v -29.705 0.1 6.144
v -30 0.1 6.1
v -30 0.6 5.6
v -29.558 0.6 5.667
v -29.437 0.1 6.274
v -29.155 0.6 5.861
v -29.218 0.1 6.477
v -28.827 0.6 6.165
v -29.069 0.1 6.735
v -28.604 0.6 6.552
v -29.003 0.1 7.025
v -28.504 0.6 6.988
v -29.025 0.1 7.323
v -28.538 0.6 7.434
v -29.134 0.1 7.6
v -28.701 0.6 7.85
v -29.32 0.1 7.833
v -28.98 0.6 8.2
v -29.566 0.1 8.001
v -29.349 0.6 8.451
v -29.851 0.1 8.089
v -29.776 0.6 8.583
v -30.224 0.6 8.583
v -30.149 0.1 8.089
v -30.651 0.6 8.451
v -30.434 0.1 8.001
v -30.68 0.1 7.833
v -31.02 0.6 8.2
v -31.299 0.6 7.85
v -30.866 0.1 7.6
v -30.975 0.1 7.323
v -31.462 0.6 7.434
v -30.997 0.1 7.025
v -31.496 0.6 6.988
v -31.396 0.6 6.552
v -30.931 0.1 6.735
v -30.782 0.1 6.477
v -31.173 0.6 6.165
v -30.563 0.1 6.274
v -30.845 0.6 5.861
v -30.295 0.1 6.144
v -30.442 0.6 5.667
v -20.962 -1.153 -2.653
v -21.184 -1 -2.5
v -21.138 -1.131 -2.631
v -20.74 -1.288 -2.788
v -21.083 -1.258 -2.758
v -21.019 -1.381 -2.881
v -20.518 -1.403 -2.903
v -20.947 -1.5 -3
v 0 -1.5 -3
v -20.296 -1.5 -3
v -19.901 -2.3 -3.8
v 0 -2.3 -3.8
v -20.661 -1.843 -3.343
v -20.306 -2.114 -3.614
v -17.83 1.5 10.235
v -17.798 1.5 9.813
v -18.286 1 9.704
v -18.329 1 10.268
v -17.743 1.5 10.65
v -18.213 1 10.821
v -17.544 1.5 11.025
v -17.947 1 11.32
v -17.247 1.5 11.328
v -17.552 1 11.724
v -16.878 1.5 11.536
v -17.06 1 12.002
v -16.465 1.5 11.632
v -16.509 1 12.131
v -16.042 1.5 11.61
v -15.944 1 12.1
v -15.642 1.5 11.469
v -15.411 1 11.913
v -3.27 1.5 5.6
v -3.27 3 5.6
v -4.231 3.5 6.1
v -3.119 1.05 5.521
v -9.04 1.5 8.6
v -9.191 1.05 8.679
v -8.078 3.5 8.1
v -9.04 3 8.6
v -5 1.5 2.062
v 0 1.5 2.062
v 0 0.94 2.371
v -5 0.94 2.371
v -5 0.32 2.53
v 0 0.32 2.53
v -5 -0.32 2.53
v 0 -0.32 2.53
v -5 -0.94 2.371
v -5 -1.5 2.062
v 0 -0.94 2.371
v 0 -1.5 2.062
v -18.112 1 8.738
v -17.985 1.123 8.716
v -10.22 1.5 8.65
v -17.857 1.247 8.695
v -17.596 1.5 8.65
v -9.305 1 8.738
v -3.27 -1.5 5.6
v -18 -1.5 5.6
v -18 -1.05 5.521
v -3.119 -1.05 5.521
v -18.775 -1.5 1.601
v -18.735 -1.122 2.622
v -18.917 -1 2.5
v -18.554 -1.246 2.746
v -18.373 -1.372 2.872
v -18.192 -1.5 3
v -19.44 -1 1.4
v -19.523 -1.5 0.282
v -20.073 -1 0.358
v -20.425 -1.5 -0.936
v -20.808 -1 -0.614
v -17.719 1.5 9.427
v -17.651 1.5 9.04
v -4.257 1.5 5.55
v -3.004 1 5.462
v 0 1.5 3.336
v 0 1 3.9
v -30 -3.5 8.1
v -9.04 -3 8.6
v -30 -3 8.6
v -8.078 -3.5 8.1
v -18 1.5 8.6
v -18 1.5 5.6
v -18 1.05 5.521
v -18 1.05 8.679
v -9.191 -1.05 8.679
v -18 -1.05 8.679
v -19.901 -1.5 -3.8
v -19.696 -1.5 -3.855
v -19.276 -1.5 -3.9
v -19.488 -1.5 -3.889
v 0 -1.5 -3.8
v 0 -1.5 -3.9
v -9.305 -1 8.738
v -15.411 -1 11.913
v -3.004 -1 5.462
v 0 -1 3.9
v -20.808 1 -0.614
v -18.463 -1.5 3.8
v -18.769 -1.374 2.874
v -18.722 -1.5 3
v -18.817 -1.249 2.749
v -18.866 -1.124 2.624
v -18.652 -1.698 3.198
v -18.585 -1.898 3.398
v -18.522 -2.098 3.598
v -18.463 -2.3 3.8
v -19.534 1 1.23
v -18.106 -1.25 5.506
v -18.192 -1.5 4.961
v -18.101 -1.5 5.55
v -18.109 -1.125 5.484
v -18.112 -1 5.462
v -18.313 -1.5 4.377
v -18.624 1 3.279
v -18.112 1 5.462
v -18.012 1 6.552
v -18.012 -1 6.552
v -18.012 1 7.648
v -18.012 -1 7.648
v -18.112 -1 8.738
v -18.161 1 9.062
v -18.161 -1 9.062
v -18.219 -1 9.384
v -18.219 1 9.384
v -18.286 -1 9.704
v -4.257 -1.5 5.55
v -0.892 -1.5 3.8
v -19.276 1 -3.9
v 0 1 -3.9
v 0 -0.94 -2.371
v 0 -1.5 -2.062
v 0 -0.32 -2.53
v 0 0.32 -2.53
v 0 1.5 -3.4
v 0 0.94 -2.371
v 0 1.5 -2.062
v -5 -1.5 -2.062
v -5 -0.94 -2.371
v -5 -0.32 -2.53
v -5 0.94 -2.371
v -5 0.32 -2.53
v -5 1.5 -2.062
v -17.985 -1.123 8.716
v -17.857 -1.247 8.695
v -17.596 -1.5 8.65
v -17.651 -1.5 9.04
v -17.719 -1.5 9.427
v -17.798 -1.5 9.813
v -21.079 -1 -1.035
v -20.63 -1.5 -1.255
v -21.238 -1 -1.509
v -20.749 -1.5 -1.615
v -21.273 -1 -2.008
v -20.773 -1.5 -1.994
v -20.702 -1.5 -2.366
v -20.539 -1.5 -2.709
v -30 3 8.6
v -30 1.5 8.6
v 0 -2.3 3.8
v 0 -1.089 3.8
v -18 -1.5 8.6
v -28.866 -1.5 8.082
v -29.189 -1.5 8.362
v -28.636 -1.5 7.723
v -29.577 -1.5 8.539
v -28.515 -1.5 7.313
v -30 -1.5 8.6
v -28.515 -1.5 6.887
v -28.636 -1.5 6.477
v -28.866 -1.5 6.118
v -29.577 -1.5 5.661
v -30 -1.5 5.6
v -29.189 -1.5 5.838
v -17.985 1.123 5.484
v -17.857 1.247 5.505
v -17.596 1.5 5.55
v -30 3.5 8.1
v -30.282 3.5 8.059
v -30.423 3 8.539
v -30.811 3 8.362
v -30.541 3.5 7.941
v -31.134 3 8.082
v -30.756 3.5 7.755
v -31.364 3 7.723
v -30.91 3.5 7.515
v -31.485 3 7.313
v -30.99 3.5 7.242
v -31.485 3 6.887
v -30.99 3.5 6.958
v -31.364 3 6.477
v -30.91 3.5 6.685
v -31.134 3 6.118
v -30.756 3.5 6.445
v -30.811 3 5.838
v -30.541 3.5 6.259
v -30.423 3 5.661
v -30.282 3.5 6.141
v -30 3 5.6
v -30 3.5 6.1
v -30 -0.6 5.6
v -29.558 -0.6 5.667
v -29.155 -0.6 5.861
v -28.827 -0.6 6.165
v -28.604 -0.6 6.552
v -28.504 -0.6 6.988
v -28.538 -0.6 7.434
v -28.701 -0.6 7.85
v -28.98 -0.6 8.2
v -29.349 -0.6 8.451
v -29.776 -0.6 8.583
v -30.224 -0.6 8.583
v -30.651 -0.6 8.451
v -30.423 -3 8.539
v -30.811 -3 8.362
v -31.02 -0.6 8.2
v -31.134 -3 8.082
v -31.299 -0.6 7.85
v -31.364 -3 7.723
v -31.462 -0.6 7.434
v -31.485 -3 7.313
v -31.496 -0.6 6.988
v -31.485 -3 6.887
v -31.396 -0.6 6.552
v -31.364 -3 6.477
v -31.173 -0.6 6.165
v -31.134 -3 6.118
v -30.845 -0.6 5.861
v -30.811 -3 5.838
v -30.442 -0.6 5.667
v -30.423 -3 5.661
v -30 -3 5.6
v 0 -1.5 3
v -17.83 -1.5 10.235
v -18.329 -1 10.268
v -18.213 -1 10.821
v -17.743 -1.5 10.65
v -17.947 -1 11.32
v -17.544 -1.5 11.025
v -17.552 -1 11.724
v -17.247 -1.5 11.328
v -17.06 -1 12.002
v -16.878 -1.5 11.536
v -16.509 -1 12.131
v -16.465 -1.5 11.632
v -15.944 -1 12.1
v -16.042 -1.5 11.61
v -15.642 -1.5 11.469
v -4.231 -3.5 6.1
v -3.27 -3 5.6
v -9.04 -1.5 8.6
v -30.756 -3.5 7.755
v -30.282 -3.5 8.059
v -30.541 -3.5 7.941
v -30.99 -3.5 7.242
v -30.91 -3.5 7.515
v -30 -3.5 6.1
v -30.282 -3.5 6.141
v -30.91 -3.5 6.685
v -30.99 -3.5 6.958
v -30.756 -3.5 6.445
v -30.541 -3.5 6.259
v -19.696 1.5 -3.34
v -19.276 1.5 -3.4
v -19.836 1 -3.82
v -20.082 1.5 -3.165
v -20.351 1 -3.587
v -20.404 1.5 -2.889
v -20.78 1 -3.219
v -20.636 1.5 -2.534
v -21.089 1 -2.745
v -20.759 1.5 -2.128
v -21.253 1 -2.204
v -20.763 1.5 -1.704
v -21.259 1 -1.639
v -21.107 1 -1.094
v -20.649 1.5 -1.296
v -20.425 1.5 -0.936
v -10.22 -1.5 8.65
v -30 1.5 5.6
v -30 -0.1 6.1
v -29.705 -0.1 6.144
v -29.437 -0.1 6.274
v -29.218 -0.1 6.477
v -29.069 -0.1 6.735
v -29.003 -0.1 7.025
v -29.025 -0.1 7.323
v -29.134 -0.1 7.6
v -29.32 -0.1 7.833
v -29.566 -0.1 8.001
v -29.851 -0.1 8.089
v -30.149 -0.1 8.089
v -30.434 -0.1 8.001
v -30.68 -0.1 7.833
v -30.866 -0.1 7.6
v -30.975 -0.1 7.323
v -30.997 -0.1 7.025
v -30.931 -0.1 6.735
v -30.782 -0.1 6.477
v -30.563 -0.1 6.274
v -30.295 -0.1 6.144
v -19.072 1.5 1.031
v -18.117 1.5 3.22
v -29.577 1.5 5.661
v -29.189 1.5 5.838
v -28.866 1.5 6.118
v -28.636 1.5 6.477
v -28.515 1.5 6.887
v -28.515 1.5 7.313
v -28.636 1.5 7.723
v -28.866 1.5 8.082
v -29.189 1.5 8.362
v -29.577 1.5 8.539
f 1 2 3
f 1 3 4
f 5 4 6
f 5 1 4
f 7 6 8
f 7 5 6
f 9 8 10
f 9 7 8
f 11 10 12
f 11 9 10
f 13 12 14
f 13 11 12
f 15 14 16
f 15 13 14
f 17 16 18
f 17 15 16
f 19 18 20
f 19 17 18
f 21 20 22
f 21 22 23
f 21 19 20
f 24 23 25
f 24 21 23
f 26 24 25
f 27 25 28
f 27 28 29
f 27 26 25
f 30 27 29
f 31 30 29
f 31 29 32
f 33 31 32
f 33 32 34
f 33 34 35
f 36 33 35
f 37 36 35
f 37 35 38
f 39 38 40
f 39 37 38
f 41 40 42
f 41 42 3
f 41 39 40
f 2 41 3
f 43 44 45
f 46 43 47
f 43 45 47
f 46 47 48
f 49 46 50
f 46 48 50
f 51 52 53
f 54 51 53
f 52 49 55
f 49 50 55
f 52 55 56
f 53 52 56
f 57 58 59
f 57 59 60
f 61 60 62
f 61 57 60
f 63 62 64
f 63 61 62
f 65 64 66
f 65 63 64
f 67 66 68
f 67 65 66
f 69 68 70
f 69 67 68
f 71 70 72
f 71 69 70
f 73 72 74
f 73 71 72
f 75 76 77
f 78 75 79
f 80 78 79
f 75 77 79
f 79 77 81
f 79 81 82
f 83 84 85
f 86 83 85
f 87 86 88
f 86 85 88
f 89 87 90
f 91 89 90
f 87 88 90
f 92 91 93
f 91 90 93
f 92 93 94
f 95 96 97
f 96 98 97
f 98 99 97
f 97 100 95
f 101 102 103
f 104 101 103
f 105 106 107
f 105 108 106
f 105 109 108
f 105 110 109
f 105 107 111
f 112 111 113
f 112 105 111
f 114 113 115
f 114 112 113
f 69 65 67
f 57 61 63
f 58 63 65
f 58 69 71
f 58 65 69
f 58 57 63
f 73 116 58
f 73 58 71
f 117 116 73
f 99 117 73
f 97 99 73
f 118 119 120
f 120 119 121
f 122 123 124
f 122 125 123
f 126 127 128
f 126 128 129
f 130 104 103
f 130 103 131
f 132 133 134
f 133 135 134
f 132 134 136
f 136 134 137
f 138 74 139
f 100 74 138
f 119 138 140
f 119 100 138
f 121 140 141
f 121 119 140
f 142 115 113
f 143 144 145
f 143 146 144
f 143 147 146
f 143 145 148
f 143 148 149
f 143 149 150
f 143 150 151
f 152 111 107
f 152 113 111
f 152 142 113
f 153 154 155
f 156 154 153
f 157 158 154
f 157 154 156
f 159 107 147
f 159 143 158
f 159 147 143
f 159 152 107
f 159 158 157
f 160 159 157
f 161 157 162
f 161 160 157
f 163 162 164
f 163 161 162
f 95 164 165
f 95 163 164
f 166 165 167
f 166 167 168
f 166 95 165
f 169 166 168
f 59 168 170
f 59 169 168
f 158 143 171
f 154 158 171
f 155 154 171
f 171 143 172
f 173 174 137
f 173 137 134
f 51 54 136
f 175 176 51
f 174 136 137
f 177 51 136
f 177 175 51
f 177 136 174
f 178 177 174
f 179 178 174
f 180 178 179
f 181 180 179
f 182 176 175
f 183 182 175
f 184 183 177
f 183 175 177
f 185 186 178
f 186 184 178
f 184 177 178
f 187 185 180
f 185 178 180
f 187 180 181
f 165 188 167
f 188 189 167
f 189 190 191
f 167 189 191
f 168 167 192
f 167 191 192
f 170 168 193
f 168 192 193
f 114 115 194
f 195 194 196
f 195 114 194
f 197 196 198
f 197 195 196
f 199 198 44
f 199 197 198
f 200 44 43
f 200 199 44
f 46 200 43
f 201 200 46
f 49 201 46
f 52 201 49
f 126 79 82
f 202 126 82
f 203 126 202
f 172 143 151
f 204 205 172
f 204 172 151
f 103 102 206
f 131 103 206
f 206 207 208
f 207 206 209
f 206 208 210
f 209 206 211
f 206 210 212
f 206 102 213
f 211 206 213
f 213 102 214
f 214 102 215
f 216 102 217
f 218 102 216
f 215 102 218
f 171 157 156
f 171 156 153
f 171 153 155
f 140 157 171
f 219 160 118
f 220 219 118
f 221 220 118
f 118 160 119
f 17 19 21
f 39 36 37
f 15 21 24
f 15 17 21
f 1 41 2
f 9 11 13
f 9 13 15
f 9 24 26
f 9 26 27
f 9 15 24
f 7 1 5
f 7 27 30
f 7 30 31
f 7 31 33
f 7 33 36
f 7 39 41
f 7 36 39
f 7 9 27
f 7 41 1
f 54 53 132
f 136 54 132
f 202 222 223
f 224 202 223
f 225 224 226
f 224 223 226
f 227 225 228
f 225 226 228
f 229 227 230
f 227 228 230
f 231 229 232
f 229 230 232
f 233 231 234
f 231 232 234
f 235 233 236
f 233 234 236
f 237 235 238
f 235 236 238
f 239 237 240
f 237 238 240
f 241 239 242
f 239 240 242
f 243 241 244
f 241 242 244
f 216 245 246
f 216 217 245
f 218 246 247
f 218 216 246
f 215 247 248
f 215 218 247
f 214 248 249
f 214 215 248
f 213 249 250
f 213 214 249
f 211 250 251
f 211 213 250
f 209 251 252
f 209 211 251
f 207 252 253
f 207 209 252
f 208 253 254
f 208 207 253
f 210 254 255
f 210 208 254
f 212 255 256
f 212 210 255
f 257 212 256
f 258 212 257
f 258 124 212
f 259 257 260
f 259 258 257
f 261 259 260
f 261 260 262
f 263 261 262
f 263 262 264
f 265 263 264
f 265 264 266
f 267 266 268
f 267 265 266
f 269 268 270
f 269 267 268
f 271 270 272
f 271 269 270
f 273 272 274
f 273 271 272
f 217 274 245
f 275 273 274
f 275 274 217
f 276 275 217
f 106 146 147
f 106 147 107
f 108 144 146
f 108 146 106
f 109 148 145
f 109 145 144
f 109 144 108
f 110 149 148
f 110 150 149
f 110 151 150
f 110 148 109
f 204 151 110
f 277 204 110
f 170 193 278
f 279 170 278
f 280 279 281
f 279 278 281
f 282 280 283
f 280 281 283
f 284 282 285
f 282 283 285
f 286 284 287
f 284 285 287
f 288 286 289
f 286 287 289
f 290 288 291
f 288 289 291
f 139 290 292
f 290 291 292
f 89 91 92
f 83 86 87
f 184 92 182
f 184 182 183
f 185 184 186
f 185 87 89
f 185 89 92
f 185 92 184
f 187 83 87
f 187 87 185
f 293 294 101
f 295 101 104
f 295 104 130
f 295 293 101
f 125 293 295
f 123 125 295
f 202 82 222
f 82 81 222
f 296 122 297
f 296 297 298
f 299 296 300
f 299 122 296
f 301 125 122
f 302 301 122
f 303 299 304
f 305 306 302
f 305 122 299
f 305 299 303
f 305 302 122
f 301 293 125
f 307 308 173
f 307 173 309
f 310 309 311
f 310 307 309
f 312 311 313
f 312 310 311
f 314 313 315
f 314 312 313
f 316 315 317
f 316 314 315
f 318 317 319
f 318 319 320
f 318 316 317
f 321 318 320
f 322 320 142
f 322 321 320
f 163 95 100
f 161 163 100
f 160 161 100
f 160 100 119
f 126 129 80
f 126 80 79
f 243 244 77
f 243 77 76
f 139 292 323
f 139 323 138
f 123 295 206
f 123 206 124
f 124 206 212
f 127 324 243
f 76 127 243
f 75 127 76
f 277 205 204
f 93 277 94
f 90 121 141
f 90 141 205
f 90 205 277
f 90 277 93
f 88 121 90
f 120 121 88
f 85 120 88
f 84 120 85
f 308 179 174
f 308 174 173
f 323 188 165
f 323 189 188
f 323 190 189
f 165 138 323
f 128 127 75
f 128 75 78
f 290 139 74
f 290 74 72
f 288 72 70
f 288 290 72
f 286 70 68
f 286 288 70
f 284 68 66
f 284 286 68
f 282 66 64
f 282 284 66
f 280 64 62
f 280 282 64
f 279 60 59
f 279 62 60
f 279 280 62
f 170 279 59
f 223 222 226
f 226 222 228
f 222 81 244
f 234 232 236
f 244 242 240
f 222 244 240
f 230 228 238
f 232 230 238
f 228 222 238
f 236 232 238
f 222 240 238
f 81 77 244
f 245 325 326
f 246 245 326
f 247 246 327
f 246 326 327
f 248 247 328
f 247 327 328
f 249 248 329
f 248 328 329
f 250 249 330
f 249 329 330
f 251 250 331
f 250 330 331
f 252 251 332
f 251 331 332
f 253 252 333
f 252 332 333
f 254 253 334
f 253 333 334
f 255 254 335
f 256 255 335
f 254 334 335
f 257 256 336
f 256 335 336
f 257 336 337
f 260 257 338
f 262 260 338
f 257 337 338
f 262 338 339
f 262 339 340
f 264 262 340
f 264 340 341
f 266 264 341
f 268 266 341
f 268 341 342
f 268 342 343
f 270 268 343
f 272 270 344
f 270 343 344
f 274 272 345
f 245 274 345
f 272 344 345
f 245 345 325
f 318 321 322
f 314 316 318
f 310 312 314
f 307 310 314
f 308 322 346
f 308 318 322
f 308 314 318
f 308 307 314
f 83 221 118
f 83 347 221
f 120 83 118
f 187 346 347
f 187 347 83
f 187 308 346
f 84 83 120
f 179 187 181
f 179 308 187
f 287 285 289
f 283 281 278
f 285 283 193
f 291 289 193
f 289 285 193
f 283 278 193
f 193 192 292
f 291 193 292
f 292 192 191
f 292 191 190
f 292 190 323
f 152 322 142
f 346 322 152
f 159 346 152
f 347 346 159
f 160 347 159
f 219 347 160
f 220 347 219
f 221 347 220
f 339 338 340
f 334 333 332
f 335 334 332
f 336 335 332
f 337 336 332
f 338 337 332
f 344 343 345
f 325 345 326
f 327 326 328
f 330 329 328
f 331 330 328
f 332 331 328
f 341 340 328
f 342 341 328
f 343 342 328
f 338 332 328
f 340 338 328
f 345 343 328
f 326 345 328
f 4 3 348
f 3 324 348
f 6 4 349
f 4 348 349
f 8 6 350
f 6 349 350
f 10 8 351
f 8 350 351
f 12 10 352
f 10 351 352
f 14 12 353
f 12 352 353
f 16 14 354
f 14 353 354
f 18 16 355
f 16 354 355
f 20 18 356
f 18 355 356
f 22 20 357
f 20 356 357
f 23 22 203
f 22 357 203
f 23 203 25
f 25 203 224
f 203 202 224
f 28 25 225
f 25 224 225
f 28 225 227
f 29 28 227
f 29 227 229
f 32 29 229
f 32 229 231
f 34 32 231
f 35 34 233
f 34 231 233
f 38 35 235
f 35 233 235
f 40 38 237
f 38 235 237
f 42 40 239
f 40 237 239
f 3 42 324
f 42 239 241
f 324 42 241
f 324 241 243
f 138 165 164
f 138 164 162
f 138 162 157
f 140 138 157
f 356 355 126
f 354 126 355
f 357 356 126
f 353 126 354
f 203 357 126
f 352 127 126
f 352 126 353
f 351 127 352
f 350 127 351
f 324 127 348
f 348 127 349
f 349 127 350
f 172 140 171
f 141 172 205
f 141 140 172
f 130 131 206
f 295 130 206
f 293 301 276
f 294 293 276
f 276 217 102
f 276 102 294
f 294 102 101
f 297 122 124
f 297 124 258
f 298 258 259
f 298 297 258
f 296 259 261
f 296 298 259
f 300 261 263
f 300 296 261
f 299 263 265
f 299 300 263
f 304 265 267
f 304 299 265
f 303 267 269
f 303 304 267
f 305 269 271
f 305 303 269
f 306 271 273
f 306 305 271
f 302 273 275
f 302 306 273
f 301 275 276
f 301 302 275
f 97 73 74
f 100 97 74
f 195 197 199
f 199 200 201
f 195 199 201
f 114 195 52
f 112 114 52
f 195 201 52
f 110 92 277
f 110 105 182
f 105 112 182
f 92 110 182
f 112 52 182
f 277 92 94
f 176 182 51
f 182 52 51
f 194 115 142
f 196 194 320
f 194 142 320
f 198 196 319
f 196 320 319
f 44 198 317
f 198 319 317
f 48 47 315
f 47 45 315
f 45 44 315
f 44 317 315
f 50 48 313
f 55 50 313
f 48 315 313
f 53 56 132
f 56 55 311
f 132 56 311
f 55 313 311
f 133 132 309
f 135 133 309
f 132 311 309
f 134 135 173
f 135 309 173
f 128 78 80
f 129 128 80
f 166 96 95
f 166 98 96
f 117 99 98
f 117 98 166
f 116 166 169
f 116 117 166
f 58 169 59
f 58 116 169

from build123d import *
from build123d.topology import SkipClean

# Parameters (mm, degrees)
BOSS_EXTRUDE1_DEPTH      = 1.5
SKETCH3_R                = 2.5500000000000003
CUT_EXTRUDE1_DEPTH       = 5
BOSS_EXTRUDE2_DEPTH      = 2
CUT_EXTRUDE2_DEPTH       = 35.91480579173508
BOSS_EXTRUDE4_REACH      = 25.469
SKETCH8_R                = 1.499999999999997
BOSS_EXTRUDE5_DEPTH      = 1.4
FILLET1_R                = 2
BOSS_EXTRUDE6_REACH      = 35.939
BOSS_EXTRUDE6_END_RADIUS = 12
MIRROR2_START            = -24.981035963
MIRROR2_DEPTH            = 24.981035963
MIRROR2_START_2          = -3
MIRROR2_2_DEPTH          = 1.5
CUT_EXTRUDE4_DEPTH       = 35.12603615991723
CHAMFER2_SIZE            = 0.5
CHAMFER1_SIZE            = 0.5


with BuildPart() as part:
    # Sketch2 → Boss-Extrude1 (new, symmetric)
    with BuildSketch(Plane(origin=(0, 0, 0), x_dir=(1, 0, 0), z_dir=(0, 1, 0))):
        with BuildLine():
            Line((0, -3.9000000000000075), (0, 3.899999999999993))
            Line((0, 3.899999999999993), (-25.204168476687265, 3.899999999999991))
            ThreePointArc((-25.204168476687265, 3.899999999999991), (-18.343183564475204, -4.250678924992998), (-20.67057742658785, -14.647309086469686))
            Line((-20.67057742658785, -14.647309086469686), (0, -3.9000000000000075))
        make_face()
    extrude(amount=BOSS_EXTRUDE1_DEPTH, both=True)

    # Sketch3 → Cut-Extrude1 (cut)
    with BuildSketch(Plane(origin=(0, 0, 0), x_dir=(0, 0, -1), z_dir=(1, 0, 0))):
        Circle(SKETCH3_R)
    extrude(amount=-CUT_EXTRUDE1_DEPTH, mode=Mode.SUBTRACT)

    # Sketch5 → Cut-Extrude2 (cut, through all)
    with BuildSketch(Plane(origin=(0, 0, 0), x_dir=(0, 0, -1), z_dir=(1, 0, 0))):
        Polygon((-8.650000000000004, 1.5), (-8.73816349035424, 0.9999999999999993), (-5.461836509645769, 0.9999999999999993), (-5.550000000000004, 1.5), align=None)
    cut_extrude2 = extrude(amount=-CUT_EXTRUDE2_DEPTH, mode=Mode.SUBTRACT)

    # Mirror1: Cut-Extrude2 across plane
    add(cut_extrude2.mirror(Plane.ZX), mode=Mode.SUBTRACT)

    # Fillet1
    fillet1_edges = [part.edges().sort_by_distance(p)[0] for p in [
        (-20.67057742658785, 0, 14.647309086469686),
        (-25.204168476687265, 0, -3.8999999999999906),
    ]]
    fillet(fillet1_edges, radius=FILLET1_R)

    # Boss-Extrude6: up to this cylinder (the profile starts outside it)
    boss_extrude6_end = Plane(origin=(-30, -1.766667, 7.100000000000005), z_dir=(0, 1, 0)) * Cylinder(BOSS_EXTRUDE6_END_RADIUS, 96.878, mode=Mode.PRIVATE)
    # Sketch9 → Boss-Extrude6 (add, up to the surface)
    with BuildSketch(Plane(origin=(0, 0, 0), x_dir=(0, 0, -1), z_dir=(1, 0, 0)), mode=Mode.PRIVATE) as boss_extrude6_sk1:
        Polygon((-3.7999999999999994, -1.5), (-3.8, -2.3), (-3, -1.5), align=None)
    boss_extrude6_tool1 = extrude(boss_extrude6_sk1.sketch, amount=-BOSS_EXTRUDE6_REACH, mode=Mode.PRIVATE) - boss_extrude6_end
    add(boss_extrude6_tool1.solids().sort_by_distance((0, -1.766667, 3.533333))[0])

    # Mirror2: read off the stored shape, not the designer's step
    # Mirror2 outline → Mirror2 (add)
    with BuildSketch(Plane.YZ.offset(MIRROR2_START)):
        Polygon((-1.5, -3.8), (-1.5, -3), (-2.3, -3.8), align=None)
    extrude(amount=MIRROR2_DEPTH)

    # Mirror2 2 outline → Mirror2 2 (cut)
    with BuildSketch(Plane(origin=(0, 0, 0), x_dir=(1, 0, 0), z_dir=(0, 1, 0)).offset(MIRROR2_START_2)):
        with BuildLine():
            Line((-22, 2.024776923), (-23.520030864, 3))
            ThreePointArc((-23.520030864, 3), (-24.236635876, 3.425380467), (-24.981035963, 3.8))
            Line((-24.981035963, 3.8), (-24.981035963, 1))
            Line((-24.981035963, 1), (-22, 1))
            Line((-22, 1), (-22, 2.024776923))
        make_face()
    extrude(amount=MIRROR2_2_DEPTH, mode=Mode.SUBTRACT)

    # Sketch10 → Cut-Extrude4 (cut, through all)
    with BuildSketch(Plane(origin=(0, -1.5, 0), x_dir=(1, 0, 0), z_dir=(0, 1, 0))):
        with BuildLine():
            Line((-19.900694505076203, 3.799999999999999), (-24.98103596346817, 3.8000000000000003))
            ThreePointArc((-24.98103596346817, 3.8000000000000003), (-24.2366358760677, 3.4253804669935803), (-23.520030864271043, 3))
            Line((-23.520030864271043, 3), (-20.946524014085387, 3))
            ThreePointArc((-20.946524014085387, 3), (-20.491332623137634, 3.488533865071372), (-19.900694505076203, 3.799999999999999))
        make_face()
    extrude(amount=-CUT_EXTRUDE4_DEPTH, mode=Mode.SUBTRACT)

    # Chamfer1
    chamfer1_edges = [part.edges().sort_by_distance(p)[0] for p in [
        (-1.5867438295232468, 1.5, 4.725000000000003),
        (-9.638097352618193, 1.5, -3.899999999999992),
        (-21.088848639586317, 1.5, -2.745154254728507),
        (-19.01317053469328, 1.5, 2.2740722860502682),
        (-18.181494014390573, 1.5, 9.17916239580129),
        (-17.552032906206957, 1.5, 11.724261681549507),
        (-12.27341621121789, 1.5, 10.281350401908949),
        (-21.27283986088827, -1.5, -1.784206552811166),
        (-19.606839169271502, -1.5, 1.1014828543538435),
        (-1.5867438295232468, -1.5, 4.725000000000003),
        (-18.181494014390573, -1.5, 9.17916239580129),
        (-17.552032906206957, -1.5, 11.724261681549507),
        (-12.27341621121789, -1.5, 10.281350401908949),
    ]]
    chamfer(chamfer1_edges, length=CHAMFER1_SIZE)


with BuildPart() as body_2:
    # Sketch4 → Boss-Extrude2 (new body)
    with BuildSketch(Plane(origin=(0, 1.5, 0), x_dir=(1, 0, 0), z_dir=(0, 1, 0))):
        with BuildLine():
            Line((-30, -5.600000000000004), (-3.2696539517448784, -5.600000000000004))
            Line((-3.2696539517448784, -5.600000000000004), (-9.039631513647626, -8.600000000000003))
            Line((-9.039631513647626, -8.600000000000003), (-30, -8.600000000000003))
            ThreePointArc((-30, -8.600000000000003), (-31.5, -7.100000000000005), (-30, -5.600000000000004))
        make_face()
    extrude(amount=BOSS_EXTRUDE2_DEPTH)

    # Boss-Extrude4: up to this plane
    boss_extrude4_end = Plane(origin=(-3.2696539517448784, 3.5, 5.600000000000004), z_dir=(-0.46130573246151213, 0, -0.8872412418266792))
    # Sketch6 → Boss-Extrude4 (add, up to the surface)
    with BuildSketch(Plane.ZY.offset(18), mode=Mode.PRIVATE) as boss_extrude4_sk1:
        Polygon((5.600000000000004, 1.5), (5.52142418927548, 1.0499999999999996), (8.678575810724528, 1.0499999999999994), (8.600000000000003, 1.5), align=None)
    boss_extrude4_tool1 = split(extrude(boss_extrude4_sk1.sketch, amount=-BOSS_EXTRUDE4_REACH, mode=Mode.PRIVATE), bisect_by=boss_extrude4_end, keep=Keep.BOTH, mode=Mode.PRIVATE)
    add(boss_extrude4_tool1.solids().sort_by_distance((-18, 1.273086, 7.1))[0])

    # Sketch8 → Boss-Extrude5 (add)
    with SkipClean():  # the faces are left unmerged after this step: merging them gives an invalid solid
        with BuildSketch(Plane.XZ.offset(-1.5)):
            with Locations(Location((-30, 7.100000000000005, 0), (0, 0, 270))):
                Circle(SKETCH8_R)
        extrude(amount=BOSS_EXTRUDE5_DEPTH)

    # Chamfer2
    chamfer2_edges = [body_2.edges().sort_by_distance(p)[0] for p in [
        (-16.63482697587244, 3.5, 5.600000000000004),
        (-30, 0.10000000000000009, 8.600000000000001),
        (-31.5, 3.5, 7.100000000000003),
        (-19.51981575682381, 3.5, 8.600000000000003),
    ]]
    chamfer(chamfer2_edges, length=CHAMFER2_SIZE)


with BuildPart() as body_3:
    # Mirror3: mirrored copy
    add(body_2.part.mirror(Plane.ZX))


solid = Compound([part.part, body_2.part, body_3.part])
